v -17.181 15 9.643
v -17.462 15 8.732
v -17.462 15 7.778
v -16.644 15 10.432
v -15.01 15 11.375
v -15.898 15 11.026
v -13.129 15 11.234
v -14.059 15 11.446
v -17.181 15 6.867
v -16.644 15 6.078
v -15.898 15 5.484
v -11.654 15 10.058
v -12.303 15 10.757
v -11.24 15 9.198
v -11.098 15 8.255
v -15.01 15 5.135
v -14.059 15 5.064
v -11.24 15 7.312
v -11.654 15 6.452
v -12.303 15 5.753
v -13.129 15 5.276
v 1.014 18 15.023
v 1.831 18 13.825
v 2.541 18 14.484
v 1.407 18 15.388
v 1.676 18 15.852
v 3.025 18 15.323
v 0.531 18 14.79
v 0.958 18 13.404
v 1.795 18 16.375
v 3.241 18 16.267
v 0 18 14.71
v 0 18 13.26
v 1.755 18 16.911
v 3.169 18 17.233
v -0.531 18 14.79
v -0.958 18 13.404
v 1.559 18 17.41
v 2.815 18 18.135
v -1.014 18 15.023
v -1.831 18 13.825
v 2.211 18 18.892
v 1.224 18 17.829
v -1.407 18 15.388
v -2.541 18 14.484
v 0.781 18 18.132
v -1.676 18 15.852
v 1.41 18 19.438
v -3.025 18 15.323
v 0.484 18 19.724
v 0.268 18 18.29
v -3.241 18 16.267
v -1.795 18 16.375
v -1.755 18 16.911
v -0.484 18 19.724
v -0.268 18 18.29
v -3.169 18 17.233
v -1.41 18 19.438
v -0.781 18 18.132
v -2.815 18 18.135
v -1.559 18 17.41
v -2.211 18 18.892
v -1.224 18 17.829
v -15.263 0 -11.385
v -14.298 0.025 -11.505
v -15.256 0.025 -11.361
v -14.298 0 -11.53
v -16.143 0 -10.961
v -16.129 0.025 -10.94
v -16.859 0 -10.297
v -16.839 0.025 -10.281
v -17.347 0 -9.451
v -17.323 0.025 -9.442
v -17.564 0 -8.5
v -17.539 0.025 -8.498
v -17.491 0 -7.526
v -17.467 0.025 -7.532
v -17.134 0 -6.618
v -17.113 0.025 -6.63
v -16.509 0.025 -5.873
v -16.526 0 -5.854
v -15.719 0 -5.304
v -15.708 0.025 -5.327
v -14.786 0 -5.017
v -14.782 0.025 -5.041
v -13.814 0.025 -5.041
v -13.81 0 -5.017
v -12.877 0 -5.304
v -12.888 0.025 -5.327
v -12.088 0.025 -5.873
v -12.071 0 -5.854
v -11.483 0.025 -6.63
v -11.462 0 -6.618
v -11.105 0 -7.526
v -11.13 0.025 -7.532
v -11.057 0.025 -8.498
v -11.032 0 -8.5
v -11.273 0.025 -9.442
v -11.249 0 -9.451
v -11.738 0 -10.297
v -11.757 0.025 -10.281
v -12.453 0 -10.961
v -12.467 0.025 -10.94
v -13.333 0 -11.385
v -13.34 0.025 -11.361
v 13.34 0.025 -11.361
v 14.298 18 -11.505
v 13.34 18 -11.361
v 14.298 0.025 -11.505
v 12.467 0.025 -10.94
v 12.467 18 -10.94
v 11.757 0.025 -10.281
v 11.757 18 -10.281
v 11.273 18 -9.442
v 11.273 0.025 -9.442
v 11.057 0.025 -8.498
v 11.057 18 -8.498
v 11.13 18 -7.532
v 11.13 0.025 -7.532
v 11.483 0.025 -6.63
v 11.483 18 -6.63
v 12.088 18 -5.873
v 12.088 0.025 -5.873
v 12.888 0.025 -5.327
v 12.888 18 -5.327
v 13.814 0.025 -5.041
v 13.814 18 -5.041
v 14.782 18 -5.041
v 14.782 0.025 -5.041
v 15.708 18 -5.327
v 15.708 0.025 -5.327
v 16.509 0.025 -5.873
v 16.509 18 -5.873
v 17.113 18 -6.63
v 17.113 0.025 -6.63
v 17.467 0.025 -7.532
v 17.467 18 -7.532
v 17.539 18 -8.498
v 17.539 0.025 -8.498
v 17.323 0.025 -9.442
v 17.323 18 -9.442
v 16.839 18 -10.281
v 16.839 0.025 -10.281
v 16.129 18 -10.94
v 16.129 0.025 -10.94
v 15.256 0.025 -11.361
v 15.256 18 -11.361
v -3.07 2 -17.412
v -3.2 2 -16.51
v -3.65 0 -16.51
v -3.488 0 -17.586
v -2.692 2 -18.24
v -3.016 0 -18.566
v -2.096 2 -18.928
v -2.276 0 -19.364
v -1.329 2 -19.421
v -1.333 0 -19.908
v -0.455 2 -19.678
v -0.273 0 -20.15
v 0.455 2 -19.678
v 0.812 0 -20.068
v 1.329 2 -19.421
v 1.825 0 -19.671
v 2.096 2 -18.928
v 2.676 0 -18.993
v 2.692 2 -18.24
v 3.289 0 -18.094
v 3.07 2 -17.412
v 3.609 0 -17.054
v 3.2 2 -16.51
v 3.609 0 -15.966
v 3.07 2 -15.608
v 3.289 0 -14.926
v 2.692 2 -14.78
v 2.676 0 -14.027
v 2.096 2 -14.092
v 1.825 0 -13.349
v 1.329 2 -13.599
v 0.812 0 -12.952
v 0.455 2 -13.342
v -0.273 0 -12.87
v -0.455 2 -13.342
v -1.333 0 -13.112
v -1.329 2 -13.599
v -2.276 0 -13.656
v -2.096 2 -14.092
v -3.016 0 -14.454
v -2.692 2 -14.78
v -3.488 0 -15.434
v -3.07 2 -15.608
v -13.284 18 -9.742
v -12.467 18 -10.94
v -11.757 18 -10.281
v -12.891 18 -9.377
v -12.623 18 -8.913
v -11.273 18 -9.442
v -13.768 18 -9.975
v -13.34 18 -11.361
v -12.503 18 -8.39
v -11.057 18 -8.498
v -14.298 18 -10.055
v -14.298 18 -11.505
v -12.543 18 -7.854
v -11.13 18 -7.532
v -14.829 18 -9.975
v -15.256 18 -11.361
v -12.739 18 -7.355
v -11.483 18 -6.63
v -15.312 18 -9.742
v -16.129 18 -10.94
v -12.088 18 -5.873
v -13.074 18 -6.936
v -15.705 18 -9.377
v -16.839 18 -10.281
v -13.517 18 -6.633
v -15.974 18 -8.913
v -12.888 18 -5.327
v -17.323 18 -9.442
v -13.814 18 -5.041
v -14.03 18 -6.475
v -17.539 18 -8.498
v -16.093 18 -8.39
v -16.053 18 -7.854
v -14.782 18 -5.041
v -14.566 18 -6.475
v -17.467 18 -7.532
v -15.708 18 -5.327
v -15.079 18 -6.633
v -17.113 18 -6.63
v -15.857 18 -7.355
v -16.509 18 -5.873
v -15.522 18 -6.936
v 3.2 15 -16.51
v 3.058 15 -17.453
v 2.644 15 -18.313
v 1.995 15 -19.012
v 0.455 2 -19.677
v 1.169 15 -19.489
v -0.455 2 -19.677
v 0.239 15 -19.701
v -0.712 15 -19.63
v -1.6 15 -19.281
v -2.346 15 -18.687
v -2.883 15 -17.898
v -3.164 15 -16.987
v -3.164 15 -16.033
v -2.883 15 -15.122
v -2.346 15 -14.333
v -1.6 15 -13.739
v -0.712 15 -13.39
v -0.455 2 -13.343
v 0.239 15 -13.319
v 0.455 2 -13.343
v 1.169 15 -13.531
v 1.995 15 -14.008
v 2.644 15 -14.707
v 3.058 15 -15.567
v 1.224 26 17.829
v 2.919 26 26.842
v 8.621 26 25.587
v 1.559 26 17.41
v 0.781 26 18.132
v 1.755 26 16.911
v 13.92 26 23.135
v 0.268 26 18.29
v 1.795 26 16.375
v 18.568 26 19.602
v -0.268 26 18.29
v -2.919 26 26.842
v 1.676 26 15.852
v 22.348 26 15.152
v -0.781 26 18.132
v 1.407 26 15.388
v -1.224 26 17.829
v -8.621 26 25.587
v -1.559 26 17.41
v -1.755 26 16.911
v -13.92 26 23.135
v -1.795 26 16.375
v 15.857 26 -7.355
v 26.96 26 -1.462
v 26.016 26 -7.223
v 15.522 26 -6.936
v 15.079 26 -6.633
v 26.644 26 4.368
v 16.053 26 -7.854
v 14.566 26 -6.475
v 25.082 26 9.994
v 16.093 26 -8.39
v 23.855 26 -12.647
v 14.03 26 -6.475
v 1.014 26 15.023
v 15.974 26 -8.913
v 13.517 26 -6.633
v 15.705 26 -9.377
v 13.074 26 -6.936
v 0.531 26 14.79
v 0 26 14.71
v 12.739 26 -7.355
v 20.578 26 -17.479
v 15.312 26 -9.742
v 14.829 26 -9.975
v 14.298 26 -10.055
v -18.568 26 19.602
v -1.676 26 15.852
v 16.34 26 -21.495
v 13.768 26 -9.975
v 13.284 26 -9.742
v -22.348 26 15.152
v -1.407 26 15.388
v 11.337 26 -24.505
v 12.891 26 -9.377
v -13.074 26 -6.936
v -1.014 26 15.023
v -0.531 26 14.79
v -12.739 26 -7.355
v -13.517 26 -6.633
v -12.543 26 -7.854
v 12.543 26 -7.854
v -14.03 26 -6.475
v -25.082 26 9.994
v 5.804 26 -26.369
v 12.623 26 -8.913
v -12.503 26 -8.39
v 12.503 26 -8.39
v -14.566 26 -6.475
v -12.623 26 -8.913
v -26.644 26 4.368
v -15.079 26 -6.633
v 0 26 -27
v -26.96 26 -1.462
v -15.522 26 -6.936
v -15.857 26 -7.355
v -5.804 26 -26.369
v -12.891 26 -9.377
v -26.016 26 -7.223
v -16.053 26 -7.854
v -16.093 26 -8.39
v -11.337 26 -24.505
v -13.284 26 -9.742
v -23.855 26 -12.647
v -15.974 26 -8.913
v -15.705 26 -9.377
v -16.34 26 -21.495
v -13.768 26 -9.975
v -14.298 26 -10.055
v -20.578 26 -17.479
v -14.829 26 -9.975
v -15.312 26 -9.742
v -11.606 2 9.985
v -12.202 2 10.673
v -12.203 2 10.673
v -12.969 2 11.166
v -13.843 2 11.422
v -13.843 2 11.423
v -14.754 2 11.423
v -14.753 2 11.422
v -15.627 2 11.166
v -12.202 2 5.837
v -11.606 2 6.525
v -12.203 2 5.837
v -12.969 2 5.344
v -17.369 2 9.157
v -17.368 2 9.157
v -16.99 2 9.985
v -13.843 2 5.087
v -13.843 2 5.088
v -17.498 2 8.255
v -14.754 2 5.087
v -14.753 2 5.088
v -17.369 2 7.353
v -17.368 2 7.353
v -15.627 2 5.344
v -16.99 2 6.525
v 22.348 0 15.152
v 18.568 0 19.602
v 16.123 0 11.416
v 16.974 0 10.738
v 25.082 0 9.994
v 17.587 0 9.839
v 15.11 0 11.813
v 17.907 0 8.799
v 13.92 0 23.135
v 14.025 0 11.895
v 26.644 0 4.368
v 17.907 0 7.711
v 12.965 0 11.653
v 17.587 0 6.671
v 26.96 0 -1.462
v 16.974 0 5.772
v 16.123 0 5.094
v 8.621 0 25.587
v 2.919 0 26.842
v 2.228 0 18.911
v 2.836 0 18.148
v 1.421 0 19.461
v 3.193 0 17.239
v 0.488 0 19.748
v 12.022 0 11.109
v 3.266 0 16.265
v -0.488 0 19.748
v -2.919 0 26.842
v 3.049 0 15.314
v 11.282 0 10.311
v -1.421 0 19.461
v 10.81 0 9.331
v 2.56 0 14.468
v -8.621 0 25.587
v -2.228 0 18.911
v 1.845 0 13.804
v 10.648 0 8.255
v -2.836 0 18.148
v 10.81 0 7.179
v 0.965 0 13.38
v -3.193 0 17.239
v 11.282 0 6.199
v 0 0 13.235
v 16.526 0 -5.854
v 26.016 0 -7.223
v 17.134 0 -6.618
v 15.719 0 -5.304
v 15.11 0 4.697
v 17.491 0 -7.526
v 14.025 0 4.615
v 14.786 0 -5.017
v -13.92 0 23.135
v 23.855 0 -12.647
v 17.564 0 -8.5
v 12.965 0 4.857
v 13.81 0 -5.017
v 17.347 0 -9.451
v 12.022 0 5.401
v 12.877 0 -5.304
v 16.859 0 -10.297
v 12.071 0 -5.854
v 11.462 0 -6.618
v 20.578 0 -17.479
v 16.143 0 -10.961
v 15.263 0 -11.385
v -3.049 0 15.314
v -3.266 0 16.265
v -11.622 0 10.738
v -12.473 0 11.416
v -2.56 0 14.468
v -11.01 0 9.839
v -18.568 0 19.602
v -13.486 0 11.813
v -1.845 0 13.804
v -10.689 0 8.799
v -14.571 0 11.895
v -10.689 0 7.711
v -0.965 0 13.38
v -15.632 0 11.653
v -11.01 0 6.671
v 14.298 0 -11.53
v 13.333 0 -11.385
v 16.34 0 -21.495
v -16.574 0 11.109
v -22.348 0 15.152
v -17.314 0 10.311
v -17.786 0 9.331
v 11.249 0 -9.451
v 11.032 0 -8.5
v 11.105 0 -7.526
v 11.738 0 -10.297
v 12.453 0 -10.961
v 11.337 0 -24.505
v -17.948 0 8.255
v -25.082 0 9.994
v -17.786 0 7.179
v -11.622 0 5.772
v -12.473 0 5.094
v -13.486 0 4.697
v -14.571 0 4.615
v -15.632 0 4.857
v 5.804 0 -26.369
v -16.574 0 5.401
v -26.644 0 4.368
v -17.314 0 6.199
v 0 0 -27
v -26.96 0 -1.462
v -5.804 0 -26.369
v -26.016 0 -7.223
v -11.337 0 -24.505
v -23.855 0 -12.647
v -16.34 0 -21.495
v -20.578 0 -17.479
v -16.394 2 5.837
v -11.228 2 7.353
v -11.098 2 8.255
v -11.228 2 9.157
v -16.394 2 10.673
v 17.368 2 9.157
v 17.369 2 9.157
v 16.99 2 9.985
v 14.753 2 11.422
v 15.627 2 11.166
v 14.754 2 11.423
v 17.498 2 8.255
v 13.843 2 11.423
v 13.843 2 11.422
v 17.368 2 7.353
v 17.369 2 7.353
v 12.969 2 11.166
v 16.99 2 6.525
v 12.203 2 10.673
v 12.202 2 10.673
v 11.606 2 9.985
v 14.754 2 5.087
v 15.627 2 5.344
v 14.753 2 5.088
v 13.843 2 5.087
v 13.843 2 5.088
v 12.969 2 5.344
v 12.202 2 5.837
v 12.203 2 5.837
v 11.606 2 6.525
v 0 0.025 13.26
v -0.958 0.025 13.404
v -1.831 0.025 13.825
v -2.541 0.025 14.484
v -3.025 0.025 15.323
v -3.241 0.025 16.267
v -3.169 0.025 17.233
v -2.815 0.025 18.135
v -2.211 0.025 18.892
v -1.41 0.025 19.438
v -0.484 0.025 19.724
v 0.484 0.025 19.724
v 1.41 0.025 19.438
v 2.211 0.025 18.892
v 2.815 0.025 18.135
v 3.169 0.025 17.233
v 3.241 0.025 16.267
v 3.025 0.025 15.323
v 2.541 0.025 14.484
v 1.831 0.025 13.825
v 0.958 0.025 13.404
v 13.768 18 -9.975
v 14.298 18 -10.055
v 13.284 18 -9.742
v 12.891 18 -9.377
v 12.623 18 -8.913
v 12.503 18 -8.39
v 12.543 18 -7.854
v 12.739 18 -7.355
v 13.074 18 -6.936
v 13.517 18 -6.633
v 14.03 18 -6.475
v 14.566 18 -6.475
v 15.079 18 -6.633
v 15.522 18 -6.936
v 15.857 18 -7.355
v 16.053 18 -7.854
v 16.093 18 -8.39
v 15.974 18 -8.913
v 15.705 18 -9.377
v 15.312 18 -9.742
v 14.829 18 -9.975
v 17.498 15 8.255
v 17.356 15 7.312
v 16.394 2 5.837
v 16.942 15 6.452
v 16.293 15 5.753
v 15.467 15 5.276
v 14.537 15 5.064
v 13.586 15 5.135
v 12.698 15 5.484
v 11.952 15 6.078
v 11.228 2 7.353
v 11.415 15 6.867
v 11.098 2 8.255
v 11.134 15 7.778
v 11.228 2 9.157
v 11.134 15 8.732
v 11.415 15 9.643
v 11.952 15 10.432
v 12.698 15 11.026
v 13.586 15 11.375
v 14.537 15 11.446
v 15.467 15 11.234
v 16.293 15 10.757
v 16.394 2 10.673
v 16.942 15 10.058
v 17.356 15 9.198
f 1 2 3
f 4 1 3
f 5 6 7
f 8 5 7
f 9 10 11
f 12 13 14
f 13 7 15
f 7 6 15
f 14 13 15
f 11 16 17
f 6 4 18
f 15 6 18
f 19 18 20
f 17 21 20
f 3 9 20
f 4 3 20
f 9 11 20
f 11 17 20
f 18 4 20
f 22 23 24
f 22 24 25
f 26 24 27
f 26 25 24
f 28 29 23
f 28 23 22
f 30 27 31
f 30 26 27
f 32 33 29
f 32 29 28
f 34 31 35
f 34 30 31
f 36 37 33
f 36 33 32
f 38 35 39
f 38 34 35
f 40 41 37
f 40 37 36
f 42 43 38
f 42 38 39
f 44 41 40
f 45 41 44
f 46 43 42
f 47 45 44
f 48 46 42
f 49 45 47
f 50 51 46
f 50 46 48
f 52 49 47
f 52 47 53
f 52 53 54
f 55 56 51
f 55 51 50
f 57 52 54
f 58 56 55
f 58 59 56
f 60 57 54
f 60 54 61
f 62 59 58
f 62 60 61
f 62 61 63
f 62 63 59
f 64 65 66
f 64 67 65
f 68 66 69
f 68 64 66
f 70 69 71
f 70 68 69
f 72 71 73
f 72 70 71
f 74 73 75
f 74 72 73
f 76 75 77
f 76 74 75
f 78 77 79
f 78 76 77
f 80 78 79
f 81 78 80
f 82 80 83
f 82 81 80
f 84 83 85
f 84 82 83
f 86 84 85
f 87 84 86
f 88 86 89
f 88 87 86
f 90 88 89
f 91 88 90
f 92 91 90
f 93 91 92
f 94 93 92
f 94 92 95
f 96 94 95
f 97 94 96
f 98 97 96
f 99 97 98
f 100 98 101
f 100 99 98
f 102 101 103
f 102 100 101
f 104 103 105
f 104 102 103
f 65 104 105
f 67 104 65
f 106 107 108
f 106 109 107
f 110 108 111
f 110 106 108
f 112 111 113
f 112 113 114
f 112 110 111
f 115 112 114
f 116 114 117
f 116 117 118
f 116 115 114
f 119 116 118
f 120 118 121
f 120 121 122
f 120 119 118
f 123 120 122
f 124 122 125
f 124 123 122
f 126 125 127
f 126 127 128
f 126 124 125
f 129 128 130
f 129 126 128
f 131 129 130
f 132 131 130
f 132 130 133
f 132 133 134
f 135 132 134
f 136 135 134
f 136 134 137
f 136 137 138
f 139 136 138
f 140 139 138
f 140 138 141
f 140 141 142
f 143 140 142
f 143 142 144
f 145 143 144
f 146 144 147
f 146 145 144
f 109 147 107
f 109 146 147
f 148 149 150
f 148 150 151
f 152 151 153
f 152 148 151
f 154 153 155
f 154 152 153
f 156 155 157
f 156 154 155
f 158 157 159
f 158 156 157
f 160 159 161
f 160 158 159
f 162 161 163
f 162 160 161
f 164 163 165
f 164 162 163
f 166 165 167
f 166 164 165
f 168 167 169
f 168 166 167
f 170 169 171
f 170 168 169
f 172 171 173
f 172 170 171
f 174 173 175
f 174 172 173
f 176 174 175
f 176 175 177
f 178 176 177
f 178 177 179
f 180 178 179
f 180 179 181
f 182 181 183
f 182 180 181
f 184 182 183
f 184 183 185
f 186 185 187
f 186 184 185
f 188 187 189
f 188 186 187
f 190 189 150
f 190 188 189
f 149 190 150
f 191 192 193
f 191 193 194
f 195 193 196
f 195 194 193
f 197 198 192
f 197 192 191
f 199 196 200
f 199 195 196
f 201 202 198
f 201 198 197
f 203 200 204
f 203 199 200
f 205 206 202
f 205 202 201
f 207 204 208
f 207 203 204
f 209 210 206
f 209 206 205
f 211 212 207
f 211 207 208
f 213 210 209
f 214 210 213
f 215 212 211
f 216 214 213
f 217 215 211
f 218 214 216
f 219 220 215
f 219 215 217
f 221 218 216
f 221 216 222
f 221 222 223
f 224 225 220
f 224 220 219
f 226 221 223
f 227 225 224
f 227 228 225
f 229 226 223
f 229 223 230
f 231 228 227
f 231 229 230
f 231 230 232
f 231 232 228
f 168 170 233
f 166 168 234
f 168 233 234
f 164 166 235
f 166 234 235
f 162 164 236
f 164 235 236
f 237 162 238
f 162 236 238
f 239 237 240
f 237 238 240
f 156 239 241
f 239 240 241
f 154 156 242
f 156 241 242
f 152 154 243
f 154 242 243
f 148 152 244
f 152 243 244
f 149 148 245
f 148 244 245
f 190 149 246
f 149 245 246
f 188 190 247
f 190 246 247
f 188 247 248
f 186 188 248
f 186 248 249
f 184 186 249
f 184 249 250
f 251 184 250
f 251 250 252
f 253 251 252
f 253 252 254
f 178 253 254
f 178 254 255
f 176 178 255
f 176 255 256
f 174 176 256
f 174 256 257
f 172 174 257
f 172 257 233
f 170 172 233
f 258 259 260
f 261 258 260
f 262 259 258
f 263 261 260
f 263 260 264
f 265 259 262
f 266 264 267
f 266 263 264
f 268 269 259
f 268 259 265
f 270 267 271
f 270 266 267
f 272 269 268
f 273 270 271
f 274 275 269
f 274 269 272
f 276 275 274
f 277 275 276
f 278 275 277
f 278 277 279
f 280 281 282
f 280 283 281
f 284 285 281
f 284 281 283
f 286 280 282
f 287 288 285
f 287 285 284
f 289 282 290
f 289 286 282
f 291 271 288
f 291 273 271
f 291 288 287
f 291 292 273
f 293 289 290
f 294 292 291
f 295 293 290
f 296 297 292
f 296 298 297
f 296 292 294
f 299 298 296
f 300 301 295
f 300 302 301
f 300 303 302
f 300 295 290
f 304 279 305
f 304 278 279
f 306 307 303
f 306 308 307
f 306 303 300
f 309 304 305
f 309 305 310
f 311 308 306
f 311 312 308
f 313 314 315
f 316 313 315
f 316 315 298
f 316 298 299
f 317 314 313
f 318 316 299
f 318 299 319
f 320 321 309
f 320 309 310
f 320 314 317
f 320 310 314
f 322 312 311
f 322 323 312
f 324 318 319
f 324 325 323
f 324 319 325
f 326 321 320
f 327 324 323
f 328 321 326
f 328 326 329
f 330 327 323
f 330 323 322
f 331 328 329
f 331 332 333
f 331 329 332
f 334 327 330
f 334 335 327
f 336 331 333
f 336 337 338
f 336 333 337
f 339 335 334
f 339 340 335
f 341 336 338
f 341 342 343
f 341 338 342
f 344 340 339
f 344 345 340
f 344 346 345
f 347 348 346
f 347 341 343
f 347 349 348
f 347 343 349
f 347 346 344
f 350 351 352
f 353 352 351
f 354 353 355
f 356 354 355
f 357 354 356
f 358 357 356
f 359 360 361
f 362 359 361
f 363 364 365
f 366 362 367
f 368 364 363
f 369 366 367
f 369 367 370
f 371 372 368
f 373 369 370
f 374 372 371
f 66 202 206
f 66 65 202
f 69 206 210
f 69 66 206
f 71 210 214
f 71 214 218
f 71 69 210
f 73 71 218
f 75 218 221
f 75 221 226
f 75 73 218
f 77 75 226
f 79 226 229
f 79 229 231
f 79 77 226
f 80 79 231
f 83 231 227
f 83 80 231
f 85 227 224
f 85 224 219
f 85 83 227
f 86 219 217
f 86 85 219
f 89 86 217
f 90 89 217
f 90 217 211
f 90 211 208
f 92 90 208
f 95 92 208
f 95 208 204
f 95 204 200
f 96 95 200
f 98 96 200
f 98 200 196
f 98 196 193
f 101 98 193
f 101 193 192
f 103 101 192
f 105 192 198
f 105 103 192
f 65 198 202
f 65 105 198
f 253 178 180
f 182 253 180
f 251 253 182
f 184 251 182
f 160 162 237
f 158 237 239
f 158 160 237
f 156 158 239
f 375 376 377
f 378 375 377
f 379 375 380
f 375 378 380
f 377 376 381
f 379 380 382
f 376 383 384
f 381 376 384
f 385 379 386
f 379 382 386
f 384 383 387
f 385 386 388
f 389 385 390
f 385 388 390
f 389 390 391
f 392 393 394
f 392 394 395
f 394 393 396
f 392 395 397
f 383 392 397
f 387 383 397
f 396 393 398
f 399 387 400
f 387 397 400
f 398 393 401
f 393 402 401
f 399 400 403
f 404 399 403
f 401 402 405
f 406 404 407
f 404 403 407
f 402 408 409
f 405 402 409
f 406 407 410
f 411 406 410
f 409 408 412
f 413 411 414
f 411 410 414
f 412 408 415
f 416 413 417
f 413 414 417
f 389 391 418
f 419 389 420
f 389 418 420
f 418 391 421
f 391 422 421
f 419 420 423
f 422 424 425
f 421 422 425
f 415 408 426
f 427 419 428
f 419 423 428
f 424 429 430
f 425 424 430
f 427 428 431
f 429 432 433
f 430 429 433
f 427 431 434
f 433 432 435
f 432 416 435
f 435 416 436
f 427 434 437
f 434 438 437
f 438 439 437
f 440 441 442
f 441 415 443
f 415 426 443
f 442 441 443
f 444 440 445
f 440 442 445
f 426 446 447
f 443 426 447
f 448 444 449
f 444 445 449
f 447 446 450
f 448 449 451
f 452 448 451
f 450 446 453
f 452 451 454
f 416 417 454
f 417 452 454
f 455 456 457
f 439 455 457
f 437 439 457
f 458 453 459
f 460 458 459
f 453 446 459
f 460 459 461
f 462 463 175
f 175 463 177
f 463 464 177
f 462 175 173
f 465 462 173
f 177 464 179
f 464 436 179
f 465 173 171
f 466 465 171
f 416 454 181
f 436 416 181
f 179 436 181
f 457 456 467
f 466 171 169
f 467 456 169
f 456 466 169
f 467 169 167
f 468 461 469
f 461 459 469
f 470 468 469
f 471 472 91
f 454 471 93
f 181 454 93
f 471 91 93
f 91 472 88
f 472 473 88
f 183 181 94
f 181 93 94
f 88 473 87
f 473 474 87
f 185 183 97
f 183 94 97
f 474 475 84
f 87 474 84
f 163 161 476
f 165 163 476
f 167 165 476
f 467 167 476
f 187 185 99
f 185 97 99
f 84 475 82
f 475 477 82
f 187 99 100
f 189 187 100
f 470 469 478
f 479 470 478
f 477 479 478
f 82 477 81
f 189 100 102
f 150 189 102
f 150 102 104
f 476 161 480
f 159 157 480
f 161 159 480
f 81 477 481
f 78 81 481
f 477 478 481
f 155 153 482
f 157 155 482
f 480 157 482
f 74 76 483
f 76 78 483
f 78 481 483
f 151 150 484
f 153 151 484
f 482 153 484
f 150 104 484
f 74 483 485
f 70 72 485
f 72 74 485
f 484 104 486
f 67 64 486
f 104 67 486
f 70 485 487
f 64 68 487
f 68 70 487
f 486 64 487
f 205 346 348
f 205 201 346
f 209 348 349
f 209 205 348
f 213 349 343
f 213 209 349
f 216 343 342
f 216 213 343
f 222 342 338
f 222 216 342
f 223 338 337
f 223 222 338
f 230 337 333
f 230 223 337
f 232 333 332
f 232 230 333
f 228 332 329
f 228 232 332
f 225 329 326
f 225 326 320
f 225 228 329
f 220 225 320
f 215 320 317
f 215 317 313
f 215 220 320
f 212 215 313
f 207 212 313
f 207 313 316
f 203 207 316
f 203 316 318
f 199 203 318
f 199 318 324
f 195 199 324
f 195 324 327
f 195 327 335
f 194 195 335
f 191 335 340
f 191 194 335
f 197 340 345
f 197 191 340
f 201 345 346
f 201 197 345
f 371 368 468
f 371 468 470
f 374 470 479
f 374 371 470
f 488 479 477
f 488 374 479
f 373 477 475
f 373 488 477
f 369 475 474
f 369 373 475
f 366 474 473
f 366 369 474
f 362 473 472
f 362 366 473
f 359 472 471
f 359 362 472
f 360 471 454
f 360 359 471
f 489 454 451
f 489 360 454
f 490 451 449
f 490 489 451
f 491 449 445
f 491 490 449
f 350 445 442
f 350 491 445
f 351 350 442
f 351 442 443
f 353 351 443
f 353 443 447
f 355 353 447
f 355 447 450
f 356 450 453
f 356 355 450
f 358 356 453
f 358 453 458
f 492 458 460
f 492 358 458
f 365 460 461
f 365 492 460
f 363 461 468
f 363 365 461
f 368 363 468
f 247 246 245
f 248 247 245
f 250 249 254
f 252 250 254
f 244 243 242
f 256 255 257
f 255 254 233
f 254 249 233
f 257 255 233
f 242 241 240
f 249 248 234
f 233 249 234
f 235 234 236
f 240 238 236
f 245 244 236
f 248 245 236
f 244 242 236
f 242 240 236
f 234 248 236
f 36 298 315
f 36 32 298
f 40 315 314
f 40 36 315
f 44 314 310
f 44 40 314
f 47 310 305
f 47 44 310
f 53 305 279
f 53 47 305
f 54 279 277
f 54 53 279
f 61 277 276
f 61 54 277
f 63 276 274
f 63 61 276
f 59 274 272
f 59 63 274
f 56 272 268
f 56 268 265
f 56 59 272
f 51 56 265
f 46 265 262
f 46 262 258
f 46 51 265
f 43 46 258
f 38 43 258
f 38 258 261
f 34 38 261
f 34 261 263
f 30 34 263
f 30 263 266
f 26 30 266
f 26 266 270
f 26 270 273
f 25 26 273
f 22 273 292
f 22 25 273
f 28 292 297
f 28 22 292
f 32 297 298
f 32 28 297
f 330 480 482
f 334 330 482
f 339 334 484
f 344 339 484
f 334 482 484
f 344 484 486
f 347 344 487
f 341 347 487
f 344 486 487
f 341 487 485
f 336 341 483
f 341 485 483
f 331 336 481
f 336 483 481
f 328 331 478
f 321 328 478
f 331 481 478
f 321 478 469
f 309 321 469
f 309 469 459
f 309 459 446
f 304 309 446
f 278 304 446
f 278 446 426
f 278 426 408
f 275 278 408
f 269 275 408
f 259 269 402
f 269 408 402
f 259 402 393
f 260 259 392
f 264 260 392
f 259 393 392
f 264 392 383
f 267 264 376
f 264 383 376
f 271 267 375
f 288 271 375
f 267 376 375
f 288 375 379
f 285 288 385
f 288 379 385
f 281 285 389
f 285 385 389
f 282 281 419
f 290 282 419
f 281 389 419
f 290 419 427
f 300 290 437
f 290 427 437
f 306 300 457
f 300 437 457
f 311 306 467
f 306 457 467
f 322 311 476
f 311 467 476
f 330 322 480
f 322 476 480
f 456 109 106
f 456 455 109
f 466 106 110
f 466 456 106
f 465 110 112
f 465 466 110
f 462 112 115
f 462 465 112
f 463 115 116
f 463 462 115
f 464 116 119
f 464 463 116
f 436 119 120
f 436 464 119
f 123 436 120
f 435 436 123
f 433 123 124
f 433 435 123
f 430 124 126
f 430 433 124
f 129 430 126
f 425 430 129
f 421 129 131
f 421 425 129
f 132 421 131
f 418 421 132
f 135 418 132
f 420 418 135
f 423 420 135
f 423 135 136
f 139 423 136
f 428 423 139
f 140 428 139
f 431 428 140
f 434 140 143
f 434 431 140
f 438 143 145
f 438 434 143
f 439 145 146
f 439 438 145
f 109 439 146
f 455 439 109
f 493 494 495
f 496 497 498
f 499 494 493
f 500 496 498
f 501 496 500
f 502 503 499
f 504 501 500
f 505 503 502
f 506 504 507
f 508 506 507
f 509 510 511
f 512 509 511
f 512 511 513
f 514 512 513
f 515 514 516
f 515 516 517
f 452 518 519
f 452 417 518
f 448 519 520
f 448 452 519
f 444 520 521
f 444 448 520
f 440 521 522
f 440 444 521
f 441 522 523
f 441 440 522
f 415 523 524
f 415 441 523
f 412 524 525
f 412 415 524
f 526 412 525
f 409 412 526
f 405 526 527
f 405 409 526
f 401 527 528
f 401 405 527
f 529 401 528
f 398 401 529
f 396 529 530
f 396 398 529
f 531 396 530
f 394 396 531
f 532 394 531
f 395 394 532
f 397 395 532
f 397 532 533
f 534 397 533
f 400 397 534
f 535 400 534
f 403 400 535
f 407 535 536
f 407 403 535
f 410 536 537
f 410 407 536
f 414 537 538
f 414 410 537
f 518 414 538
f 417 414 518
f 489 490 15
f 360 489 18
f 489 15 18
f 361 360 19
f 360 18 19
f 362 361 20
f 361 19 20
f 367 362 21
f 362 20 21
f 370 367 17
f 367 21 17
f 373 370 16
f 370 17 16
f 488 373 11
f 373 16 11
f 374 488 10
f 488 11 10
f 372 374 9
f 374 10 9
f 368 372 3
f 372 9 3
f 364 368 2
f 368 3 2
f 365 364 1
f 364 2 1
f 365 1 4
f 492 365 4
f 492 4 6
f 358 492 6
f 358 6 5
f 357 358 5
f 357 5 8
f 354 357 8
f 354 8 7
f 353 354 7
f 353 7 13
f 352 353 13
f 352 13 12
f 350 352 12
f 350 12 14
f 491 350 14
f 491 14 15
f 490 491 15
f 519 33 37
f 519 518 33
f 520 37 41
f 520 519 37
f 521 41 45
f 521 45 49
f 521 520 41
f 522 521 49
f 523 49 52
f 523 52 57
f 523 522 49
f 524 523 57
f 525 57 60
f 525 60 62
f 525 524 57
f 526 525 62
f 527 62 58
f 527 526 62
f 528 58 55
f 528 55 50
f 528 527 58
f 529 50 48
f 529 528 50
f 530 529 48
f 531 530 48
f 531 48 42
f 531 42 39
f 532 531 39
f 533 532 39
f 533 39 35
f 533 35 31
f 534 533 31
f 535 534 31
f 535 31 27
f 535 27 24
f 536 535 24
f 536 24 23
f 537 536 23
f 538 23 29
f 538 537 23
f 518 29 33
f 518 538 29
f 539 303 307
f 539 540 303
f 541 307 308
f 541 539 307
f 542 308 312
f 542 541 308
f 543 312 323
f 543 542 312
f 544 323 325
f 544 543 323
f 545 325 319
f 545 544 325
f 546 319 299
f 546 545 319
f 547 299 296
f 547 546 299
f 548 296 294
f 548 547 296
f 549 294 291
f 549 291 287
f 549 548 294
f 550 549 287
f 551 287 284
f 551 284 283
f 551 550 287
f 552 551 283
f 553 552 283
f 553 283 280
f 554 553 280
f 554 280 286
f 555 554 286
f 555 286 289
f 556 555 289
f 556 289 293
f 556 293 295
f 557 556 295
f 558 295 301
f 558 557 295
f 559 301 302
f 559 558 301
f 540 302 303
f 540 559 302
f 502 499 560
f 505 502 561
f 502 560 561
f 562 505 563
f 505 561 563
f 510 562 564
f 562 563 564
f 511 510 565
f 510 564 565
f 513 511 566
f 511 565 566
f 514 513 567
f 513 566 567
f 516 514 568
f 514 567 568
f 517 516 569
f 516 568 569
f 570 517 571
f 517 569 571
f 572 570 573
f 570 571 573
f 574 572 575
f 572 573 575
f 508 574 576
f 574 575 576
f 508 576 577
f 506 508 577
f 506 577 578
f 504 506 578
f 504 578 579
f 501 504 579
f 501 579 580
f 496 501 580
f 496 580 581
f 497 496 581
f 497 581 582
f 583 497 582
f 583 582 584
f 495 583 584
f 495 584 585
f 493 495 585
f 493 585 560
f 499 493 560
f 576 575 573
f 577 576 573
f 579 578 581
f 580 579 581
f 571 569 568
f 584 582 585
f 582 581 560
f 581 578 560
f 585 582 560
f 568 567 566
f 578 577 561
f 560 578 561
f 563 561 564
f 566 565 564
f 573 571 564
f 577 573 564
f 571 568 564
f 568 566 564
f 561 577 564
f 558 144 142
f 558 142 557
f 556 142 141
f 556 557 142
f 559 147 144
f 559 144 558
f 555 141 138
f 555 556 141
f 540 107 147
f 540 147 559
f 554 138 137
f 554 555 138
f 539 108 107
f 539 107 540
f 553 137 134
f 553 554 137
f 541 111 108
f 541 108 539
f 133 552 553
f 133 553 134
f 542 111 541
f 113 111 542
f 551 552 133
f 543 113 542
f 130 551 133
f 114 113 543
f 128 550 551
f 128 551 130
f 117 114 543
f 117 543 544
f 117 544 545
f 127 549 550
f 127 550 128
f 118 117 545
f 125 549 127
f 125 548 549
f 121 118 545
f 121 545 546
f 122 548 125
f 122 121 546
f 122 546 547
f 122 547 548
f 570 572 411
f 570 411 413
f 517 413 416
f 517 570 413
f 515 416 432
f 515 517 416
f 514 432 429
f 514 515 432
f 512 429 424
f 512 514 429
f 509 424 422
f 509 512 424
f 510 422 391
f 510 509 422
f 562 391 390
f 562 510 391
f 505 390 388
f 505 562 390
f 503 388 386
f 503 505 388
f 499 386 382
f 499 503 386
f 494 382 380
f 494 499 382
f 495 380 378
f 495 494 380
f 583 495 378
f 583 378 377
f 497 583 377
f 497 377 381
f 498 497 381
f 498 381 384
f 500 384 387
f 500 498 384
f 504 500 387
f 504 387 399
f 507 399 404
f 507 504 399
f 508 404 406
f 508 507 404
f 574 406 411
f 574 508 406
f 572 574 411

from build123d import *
from OCP.BRepFilletAPI import BRepFilletAPI_MakeChamfer

# Parameters (mm, degrees)
SKETCH2_R                     = 27
BOSS_EXTRUDE2_DEPTH           = 26
CBORE_FOR_M3_SHCS1_AT_2_COUNT = 2
CBORE_FOR_M3_SHCS1_AT_2_PITCH = 28.596158833
CBORE_FOR_M3_SHCS1_AT_3_COUNT = 2
CBORE_FOR_M3_SHCS1_AT_3_PITCH = 28.596158833
HOLE1_D                       = 6.4
HOLE1_DEPTH                   = 15
HOLE1_CBORE_D                 = 7.3
HOLE1_CBORE_DEPTH             = 2
CHAMFER1_SIZE                 = 2
CHAMFER1_SIZE_2               = 0.45


with BuildPart() as part:
    # Sketch2 → Boss-Extrude2 (new body)
    with BuildSketch(Plane(origin=(0, 0, 0), x_dir=(1, 0, 0), z_dir=(0, 1, 0))):
        with Locations(Location((0, 0, 0), (0, 0, 90))):
            Circle(SKETCH2_R)
    extrude(amount=BOSS_EXTRUDE2_DEPTH)

    # Sketch5 → CBORE for M3 SHCS1 (revolve, cut)
    with BuildSketch(Plane(origin=(0, 0, 16.51), x_dir=(0, 0, -1), z_dir=(1, 0, 0))):
        Polygon((0, 0), (0, 26), (1.8, 26), (1.8, 18), (3.25, 18), (3.25, 0.025), (3.275, 0), align=None)
    cbore_for_m3_shcs1 = revolve(axis=Axis((0, -6.35, 16.51), (0, 1, 0)), mode=Mode.SUBTRACT)

    # CBORE for M3 SHCS1 at 2: CBORE for M3 SHCS1 ×2
    with Locations(*[Vector(0.5000000000000012, 0, -0.8660254037844379) * (i * CBORE_FOR_M3_SHCS1_AT_2_PITCH) for i in range(1, CBORE_FOR_M3_SHCS1_AT_2_COUNT)]):
        add(cbore_for_m3_shcs1, mode=Mode.SUBTRACT)

    # CBORE for M3 SHCS1 at 3: CBORE for M3 SHCS1 ×2
    with Locations(*[Vector(-0.4999999999999978, 0, -0.8660254037844399) * (i * CBORE_FOR_M3_SHCS1_AT_3_PITCH) for i in range(1, CBORE_FOR_M3_SHCS1_AT_3_COUNT)]):
        add(cbore_for_m3_shcs1, mode=Mode.SUBTRACT)

    # Hole1
    with Locations(Plane(origin=(0, 0, 0), x_dir=(-1, 0, 0), z_dir=(0, -1, 0))):
        with Locations((14.298079416, -8.255), (0, 16.51), (-14.298079416, -8.255)):
            CounterBoreHole(HOLE1_D / 2, HOLE1_CBORE_D / 2, HOLE1_CBORE_DEPTH, depth=HOLE1_DEPTH)

    # Chamfer1
    chamfer1_edges_1 = [part.edges().sort_by_distance(p)[0] for p in [
        (17.948079416, 2, 8.255),
    ]]
    chamfer1_side_1 = [part.faces().sort_by_distance(p)[0] for p in [
        (17.948079416, 1.991, 8.255),
    ]]
    chamfer1_edges_2 = [part.edges().sort_by_distance(p)[0] for p in [
        (3.65, 2, -16.51),
    ]]
    chamfer1_side_2 = [part.faces().sort_by_distance(p)[0] for p in [
        (3.65, 1.991, -16.51),
    ]]
    chamfer1_edges_3 = [part.edges().sort_by_distance(p)[0] for p in [
        (-10.648079416, 2, 8.255),
    ]]
    chamfer1_side_3 = [part.faces().sort_by_distance(p)[0] for p in [
        (-10.648079416, 1.991, 8.255),
    ]]
    chamfer1 = BRepFilletAPI_MakeChamfer(part.part.solid().wrapped)
    for e in chamfer1_edges_1:
        chamfer1.Add(CHAMFER1_SIZE - 0.0001, CHAMFER1_SIZE_2 - 0.0001, e.wrapped, chamfer1_side_1[0].wrapped)
    for e in chamfer1_edges_2:
        chamfer1.Add(CHAMFER1_SIZE - 0.0001, CHAMFER1_SIZE_2 - 0.0001, e.wrapped, chamfer1_side_2[0].wrapped)
    for e in chamfer1_edges_3:
        chamfer1.Add(CHAMFER1_SIZE - 0.0001, CHAMFER1_SIZE_2 - 0.0001, e.wrapped, chamfer1_side_3[0].wrapped)
    add(Compound.cast(chamfer1.Shape()), mode=Mode.REPLACE)  # a hair under: the kernel refuses the full size


solid = part.part
